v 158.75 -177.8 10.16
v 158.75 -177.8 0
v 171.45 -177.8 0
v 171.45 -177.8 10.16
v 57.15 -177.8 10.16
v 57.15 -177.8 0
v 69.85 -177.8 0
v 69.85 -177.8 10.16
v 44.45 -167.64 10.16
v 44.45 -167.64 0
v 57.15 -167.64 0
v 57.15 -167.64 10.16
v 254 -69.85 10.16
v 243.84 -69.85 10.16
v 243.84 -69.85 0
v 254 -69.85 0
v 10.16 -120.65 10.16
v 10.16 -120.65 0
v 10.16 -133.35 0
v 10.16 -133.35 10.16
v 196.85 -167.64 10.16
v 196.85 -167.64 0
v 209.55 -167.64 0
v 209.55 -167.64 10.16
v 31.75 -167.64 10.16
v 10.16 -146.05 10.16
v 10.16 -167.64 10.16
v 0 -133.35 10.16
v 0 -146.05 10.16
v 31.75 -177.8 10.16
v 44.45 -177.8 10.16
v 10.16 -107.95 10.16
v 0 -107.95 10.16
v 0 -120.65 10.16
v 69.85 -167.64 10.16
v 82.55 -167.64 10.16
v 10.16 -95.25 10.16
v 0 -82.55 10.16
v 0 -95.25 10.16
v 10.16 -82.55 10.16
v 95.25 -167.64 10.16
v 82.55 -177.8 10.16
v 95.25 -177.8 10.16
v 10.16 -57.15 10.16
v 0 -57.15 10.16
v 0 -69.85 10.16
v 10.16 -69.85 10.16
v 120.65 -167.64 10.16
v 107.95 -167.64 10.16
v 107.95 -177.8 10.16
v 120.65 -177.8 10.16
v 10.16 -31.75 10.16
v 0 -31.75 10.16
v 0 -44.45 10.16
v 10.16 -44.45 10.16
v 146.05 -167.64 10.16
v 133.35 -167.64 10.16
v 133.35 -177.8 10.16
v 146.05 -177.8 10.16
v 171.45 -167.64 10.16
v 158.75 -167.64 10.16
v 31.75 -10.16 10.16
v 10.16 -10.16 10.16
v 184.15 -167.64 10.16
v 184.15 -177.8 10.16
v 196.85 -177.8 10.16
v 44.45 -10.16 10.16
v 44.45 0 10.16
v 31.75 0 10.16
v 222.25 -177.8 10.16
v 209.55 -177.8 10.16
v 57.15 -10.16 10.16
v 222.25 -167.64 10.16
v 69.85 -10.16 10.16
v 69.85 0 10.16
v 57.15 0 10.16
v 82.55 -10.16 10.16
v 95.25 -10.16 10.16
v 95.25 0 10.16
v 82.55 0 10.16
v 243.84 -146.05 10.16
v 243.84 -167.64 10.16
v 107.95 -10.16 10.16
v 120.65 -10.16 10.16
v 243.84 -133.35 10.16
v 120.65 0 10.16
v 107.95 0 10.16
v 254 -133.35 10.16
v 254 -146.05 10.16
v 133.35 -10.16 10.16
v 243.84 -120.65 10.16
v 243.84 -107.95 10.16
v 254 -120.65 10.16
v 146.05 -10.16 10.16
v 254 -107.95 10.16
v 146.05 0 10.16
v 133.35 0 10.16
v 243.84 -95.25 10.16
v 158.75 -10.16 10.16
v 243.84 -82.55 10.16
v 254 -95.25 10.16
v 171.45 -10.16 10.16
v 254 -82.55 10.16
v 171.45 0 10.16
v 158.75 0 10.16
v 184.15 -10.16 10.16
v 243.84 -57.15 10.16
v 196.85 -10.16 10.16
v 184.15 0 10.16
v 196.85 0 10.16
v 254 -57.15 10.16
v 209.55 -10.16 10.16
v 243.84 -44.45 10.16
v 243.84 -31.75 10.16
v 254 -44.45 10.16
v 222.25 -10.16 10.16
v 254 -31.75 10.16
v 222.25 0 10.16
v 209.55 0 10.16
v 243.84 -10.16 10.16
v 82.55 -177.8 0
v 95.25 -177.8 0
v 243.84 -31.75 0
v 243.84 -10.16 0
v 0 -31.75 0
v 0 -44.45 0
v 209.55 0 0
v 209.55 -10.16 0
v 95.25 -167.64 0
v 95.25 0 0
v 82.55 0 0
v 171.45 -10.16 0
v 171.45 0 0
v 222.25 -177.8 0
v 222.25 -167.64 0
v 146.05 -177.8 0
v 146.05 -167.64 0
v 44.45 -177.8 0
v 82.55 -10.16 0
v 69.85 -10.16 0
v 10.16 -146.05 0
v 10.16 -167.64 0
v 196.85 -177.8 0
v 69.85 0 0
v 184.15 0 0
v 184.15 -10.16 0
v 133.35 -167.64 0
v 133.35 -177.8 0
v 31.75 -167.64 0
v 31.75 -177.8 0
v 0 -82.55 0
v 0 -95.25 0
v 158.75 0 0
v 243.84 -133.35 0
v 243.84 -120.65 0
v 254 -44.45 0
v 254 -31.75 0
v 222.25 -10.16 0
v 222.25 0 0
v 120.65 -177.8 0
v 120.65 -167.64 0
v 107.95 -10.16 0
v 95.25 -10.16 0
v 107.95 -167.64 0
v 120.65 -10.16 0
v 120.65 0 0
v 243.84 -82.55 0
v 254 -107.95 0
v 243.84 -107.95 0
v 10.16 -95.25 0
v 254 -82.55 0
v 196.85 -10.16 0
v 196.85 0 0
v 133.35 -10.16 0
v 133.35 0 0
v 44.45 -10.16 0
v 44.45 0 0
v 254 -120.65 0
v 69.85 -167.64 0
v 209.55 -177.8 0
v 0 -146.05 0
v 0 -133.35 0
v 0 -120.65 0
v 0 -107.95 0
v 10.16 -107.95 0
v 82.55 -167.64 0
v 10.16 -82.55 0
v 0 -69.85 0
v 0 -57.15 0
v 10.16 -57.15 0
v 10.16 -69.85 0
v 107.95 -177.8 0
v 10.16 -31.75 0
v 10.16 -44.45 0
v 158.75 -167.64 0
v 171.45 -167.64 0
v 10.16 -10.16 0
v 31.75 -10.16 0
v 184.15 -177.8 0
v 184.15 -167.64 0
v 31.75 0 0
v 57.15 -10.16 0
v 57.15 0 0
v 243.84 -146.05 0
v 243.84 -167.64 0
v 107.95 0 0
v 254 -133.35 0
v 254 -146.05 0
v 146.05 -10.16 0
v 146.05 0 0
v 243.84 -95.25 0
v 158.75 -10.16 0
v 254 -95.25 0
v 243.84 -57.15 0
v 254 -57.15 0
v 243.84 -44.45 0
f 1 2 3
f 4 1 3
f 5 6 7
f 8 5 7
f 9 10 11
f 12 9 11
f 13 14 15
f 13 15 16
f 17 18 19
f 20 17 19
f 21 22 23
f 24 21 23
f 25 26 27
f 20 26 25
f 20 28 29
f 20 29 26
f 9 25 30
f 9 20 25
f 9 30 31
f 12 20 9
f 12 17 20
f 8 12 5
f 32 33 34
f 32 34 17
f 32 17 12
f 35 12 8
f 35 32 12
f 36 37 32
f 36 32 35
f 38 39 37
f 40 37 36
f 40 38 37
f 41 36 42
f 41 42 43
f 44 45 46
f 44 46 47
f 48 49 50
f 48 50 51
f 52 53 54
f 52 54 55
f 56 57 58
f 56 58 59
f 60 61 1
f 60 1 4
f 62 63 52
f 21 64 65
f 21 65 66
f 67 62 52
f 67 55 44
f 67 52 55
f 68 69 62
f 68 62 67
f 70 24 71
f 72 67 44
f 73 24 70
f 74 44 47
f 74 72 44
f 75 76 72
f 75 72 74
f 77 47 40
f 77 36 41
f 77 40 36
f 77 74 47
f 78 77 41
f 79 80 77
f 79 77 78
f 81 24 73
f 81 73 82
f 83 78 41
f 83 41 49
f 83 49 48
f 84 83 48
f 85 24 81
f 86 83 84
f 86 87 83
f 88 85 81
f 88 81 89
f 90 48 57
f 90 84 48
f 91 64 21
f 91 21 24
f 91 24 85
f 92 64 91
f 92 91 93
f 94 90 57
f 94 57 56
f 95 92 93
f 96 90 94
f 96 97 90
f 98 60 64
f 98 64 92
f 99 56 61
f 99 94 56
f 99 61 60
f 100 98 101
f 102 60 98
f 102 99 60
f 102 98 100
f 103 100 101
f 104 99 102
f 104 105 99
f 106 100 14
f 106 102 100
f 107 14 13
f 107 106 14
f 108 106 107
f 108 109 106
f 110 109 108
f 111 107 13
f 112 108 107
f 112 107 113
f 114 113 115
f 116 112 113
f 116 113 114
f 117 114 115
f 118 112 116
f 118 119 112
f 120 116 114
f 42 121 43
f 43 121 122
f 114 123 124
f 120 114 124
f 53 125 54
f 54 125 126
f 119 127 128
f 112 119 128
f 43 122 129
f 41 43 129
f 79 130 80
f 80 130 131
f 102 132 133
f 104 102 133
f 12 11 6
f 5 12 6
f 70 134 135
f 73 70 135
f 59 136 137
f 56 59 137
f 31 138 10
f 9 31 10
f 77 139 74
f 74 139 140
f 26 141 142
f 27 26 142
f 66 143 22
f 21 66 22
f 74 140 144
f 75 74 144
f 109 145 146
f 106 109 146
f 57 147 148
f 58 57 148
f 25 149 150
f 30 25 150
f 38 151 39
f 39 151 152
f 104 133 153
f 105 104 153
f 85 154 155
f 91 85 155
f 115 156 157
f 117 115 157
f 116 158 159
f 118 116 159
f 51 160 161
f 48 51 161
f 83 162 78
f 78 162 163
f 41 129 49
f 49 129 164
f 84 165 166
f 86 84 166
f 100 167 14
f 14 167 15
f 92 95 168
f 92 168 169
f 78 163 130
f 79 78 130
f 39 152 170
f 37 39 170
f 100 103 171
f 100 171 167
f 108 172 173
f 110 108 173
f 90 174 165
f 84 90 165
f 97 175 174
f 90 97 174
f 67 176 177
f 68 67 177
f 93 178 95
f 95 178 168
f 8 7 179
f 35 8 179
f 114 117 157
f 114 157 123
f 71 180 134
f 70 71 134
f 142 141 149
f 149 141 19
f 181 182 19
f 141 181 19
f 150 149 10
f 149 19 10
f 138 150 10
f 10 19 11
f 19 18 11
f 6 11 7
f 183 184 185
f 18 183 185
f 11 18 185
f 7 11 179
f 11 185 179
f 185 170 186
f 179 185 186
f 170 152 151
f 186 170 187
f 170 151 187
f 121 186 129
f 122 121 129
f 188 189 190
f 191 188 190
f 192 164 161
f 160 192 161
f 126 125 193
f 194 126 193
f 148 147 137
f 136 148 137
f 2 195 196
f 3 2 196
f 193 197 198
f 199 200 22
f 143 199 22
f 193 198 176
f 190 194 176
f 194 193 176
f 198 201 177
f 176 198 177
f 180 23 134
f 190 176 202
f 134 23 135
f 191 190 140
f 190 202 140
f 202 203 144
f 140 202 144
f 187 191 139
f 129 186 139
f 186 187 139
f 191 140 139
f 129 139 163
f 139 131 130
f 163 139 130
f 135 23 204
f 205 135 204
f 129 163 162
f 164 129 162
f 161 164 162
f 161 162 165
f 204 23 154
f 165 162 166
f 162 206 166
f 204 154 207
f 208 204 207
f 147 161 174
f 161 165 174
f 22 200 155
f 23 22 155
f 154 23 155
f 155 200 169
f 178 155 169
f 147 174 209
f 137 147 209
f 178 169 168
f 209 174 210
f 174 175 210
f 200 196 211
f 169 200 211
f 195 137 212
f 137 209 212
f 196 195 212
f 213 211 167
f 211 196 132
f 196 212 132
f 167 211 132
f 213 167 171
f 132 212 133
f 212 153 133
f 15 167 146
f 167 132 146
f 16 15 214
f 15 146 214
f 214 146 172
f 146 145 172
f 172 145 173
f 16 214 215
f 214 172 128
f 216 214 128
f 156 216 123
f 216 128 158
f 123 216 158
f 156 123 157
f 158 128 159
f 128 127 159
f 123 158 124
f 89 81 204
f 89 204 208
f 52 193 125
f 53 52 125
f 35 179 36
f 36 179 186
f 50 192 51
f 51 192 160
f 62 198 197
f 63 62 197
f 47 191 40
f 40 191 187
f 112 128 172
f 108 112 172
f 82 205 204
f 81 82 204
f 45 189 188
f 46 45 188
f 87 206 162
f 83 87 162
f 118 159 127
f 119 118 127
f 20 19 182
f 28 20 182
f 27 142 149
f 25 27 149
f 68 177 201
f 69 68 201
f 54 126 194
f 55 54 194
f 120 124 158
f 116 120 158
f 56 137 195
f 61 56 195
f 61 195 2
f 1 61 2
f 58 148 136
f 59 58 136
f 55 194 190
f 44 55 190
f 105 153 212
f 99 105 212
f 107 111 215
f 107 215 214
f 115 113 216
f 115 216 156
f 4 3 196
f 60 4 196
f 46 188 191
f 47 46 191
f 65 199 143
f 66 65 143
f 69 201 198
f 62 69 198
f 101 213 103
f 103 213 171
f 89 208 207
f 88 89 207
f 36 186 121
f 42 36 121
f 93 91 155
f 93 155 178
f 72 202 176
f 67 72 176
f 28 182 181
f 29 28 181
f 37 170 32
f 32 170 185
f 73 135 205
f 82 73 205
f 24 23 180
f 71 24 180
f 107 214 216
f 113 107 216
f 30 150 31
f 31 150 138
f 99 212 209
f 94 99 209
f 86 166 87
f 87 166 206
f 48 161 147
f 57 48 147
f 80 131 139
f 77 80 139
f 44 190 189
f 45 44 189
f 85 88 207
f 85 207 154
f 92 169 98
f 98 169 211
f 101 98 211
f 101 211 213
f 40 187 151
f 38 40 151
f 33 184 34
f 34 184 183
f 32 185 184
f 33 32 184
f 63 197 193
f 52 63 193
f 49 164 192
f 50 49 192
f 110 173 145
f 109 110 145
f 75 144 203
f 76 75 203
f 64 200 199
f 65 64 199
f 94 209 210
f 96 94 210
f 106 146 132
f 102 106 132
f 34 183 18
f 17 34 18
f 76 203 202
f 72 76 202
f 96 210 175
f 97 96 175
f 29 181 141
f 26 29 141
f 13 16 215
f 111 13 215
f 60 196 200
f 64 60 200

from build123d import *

# Parameters (mm, degrees)
F1_DEPTH = 10.16


with BuildPart() as f1:
    # F0 (on Top) → F1 (new body)
    with BuildSketch(Plane.XY):
        Polygon((44.45, 0), (31.75, 0), (31.75, -10.16), (10.16, -10.16), (10.16, -31.75), (0, -31.75), (0, -44.45), (10.16, -44.45), (10.16, -57.15), (0, -57.15), (0, -69.85), (10.16, -69.85), (10.16, -82.55), (0, -82.55), (0, -95.25), (10.16, -95.25), (10.16, -107.95), (0, -107.95), (0, -120.65), (10.16, -120.65), (10.16, -133.35), (0, -133.35), (0, -146.05), (10.16, -146.05), (10.16, -167.64), (31.75, -167.64), (31.75, -177.8), (44.45, -177.8), (44.45, -167.64), (57.15, -167.64), (57.15, -177.8), (69.85, -177.8), (69.85, -167.64), (82.55, -167.64), (82.55, -177.8), (95.25, -177.8), (95.25, -167.64), (107.95, -167.64), (107.95, -177.8), (120.65, -177.8), (120.65, -167.64), (133.35, -167.64), (133.35, -177.8), (146.05, -177.8), (146.05, -167.64), (158.75, -167.64), (158.75, -177.8), (171.45, -177.8), (171.45, -167.64), (184.15, -167.64), (184.15, -177.8), (196.85, -177.8), (196.85, -167.64), (209.55, -167.64), (209.55, -177.8), (222.25, -177.8), (222.25, -167.64), (243.84, -167.64), (243.84, -146.05), (254, -146.05), (254, -133.35), (243.84, -133.35), (243.84, -120.65), (254, -120.65), (254, -107.95), (243.84, -107.95), (243.84, -95.25), (254, -95.25), (254, -82.55), (243.84, -82.55), (243.84, -69.85), (254, -69.85), (254, -57.15), (243.84, -57.15), (243.84, -44.45), (254, -44.45), (254, -31.75), (243.84, -31.75), (243.84, -10.16), (222.25, -10.16), (222.25, 0), (209.55, 0), (209.55, -10.16), (196.85, -10.16), (196.85, 0), (184.15, 0), (184.15, -10.16), (171.45, -10.16), (171.45, 0), (158.75, 0), (158.75, -10.16), (146.05, -10.16), (146.05, 0), (133.35, 0), (133.35, -10.16), (120.65, -10.16), (120.65, 0), (107.95, 0), (107.95, -10.16), (95.25, -10.16), (95.25, 0), (82.55, 0), (82.55, -10.16), (69.85, -10.16), (69.85, 0), (57.15, 0), (57.15, -10.16), (44.45, -10.16), align=None)
    extrude(amount=F1_DEPTH)


solid = f1.part
